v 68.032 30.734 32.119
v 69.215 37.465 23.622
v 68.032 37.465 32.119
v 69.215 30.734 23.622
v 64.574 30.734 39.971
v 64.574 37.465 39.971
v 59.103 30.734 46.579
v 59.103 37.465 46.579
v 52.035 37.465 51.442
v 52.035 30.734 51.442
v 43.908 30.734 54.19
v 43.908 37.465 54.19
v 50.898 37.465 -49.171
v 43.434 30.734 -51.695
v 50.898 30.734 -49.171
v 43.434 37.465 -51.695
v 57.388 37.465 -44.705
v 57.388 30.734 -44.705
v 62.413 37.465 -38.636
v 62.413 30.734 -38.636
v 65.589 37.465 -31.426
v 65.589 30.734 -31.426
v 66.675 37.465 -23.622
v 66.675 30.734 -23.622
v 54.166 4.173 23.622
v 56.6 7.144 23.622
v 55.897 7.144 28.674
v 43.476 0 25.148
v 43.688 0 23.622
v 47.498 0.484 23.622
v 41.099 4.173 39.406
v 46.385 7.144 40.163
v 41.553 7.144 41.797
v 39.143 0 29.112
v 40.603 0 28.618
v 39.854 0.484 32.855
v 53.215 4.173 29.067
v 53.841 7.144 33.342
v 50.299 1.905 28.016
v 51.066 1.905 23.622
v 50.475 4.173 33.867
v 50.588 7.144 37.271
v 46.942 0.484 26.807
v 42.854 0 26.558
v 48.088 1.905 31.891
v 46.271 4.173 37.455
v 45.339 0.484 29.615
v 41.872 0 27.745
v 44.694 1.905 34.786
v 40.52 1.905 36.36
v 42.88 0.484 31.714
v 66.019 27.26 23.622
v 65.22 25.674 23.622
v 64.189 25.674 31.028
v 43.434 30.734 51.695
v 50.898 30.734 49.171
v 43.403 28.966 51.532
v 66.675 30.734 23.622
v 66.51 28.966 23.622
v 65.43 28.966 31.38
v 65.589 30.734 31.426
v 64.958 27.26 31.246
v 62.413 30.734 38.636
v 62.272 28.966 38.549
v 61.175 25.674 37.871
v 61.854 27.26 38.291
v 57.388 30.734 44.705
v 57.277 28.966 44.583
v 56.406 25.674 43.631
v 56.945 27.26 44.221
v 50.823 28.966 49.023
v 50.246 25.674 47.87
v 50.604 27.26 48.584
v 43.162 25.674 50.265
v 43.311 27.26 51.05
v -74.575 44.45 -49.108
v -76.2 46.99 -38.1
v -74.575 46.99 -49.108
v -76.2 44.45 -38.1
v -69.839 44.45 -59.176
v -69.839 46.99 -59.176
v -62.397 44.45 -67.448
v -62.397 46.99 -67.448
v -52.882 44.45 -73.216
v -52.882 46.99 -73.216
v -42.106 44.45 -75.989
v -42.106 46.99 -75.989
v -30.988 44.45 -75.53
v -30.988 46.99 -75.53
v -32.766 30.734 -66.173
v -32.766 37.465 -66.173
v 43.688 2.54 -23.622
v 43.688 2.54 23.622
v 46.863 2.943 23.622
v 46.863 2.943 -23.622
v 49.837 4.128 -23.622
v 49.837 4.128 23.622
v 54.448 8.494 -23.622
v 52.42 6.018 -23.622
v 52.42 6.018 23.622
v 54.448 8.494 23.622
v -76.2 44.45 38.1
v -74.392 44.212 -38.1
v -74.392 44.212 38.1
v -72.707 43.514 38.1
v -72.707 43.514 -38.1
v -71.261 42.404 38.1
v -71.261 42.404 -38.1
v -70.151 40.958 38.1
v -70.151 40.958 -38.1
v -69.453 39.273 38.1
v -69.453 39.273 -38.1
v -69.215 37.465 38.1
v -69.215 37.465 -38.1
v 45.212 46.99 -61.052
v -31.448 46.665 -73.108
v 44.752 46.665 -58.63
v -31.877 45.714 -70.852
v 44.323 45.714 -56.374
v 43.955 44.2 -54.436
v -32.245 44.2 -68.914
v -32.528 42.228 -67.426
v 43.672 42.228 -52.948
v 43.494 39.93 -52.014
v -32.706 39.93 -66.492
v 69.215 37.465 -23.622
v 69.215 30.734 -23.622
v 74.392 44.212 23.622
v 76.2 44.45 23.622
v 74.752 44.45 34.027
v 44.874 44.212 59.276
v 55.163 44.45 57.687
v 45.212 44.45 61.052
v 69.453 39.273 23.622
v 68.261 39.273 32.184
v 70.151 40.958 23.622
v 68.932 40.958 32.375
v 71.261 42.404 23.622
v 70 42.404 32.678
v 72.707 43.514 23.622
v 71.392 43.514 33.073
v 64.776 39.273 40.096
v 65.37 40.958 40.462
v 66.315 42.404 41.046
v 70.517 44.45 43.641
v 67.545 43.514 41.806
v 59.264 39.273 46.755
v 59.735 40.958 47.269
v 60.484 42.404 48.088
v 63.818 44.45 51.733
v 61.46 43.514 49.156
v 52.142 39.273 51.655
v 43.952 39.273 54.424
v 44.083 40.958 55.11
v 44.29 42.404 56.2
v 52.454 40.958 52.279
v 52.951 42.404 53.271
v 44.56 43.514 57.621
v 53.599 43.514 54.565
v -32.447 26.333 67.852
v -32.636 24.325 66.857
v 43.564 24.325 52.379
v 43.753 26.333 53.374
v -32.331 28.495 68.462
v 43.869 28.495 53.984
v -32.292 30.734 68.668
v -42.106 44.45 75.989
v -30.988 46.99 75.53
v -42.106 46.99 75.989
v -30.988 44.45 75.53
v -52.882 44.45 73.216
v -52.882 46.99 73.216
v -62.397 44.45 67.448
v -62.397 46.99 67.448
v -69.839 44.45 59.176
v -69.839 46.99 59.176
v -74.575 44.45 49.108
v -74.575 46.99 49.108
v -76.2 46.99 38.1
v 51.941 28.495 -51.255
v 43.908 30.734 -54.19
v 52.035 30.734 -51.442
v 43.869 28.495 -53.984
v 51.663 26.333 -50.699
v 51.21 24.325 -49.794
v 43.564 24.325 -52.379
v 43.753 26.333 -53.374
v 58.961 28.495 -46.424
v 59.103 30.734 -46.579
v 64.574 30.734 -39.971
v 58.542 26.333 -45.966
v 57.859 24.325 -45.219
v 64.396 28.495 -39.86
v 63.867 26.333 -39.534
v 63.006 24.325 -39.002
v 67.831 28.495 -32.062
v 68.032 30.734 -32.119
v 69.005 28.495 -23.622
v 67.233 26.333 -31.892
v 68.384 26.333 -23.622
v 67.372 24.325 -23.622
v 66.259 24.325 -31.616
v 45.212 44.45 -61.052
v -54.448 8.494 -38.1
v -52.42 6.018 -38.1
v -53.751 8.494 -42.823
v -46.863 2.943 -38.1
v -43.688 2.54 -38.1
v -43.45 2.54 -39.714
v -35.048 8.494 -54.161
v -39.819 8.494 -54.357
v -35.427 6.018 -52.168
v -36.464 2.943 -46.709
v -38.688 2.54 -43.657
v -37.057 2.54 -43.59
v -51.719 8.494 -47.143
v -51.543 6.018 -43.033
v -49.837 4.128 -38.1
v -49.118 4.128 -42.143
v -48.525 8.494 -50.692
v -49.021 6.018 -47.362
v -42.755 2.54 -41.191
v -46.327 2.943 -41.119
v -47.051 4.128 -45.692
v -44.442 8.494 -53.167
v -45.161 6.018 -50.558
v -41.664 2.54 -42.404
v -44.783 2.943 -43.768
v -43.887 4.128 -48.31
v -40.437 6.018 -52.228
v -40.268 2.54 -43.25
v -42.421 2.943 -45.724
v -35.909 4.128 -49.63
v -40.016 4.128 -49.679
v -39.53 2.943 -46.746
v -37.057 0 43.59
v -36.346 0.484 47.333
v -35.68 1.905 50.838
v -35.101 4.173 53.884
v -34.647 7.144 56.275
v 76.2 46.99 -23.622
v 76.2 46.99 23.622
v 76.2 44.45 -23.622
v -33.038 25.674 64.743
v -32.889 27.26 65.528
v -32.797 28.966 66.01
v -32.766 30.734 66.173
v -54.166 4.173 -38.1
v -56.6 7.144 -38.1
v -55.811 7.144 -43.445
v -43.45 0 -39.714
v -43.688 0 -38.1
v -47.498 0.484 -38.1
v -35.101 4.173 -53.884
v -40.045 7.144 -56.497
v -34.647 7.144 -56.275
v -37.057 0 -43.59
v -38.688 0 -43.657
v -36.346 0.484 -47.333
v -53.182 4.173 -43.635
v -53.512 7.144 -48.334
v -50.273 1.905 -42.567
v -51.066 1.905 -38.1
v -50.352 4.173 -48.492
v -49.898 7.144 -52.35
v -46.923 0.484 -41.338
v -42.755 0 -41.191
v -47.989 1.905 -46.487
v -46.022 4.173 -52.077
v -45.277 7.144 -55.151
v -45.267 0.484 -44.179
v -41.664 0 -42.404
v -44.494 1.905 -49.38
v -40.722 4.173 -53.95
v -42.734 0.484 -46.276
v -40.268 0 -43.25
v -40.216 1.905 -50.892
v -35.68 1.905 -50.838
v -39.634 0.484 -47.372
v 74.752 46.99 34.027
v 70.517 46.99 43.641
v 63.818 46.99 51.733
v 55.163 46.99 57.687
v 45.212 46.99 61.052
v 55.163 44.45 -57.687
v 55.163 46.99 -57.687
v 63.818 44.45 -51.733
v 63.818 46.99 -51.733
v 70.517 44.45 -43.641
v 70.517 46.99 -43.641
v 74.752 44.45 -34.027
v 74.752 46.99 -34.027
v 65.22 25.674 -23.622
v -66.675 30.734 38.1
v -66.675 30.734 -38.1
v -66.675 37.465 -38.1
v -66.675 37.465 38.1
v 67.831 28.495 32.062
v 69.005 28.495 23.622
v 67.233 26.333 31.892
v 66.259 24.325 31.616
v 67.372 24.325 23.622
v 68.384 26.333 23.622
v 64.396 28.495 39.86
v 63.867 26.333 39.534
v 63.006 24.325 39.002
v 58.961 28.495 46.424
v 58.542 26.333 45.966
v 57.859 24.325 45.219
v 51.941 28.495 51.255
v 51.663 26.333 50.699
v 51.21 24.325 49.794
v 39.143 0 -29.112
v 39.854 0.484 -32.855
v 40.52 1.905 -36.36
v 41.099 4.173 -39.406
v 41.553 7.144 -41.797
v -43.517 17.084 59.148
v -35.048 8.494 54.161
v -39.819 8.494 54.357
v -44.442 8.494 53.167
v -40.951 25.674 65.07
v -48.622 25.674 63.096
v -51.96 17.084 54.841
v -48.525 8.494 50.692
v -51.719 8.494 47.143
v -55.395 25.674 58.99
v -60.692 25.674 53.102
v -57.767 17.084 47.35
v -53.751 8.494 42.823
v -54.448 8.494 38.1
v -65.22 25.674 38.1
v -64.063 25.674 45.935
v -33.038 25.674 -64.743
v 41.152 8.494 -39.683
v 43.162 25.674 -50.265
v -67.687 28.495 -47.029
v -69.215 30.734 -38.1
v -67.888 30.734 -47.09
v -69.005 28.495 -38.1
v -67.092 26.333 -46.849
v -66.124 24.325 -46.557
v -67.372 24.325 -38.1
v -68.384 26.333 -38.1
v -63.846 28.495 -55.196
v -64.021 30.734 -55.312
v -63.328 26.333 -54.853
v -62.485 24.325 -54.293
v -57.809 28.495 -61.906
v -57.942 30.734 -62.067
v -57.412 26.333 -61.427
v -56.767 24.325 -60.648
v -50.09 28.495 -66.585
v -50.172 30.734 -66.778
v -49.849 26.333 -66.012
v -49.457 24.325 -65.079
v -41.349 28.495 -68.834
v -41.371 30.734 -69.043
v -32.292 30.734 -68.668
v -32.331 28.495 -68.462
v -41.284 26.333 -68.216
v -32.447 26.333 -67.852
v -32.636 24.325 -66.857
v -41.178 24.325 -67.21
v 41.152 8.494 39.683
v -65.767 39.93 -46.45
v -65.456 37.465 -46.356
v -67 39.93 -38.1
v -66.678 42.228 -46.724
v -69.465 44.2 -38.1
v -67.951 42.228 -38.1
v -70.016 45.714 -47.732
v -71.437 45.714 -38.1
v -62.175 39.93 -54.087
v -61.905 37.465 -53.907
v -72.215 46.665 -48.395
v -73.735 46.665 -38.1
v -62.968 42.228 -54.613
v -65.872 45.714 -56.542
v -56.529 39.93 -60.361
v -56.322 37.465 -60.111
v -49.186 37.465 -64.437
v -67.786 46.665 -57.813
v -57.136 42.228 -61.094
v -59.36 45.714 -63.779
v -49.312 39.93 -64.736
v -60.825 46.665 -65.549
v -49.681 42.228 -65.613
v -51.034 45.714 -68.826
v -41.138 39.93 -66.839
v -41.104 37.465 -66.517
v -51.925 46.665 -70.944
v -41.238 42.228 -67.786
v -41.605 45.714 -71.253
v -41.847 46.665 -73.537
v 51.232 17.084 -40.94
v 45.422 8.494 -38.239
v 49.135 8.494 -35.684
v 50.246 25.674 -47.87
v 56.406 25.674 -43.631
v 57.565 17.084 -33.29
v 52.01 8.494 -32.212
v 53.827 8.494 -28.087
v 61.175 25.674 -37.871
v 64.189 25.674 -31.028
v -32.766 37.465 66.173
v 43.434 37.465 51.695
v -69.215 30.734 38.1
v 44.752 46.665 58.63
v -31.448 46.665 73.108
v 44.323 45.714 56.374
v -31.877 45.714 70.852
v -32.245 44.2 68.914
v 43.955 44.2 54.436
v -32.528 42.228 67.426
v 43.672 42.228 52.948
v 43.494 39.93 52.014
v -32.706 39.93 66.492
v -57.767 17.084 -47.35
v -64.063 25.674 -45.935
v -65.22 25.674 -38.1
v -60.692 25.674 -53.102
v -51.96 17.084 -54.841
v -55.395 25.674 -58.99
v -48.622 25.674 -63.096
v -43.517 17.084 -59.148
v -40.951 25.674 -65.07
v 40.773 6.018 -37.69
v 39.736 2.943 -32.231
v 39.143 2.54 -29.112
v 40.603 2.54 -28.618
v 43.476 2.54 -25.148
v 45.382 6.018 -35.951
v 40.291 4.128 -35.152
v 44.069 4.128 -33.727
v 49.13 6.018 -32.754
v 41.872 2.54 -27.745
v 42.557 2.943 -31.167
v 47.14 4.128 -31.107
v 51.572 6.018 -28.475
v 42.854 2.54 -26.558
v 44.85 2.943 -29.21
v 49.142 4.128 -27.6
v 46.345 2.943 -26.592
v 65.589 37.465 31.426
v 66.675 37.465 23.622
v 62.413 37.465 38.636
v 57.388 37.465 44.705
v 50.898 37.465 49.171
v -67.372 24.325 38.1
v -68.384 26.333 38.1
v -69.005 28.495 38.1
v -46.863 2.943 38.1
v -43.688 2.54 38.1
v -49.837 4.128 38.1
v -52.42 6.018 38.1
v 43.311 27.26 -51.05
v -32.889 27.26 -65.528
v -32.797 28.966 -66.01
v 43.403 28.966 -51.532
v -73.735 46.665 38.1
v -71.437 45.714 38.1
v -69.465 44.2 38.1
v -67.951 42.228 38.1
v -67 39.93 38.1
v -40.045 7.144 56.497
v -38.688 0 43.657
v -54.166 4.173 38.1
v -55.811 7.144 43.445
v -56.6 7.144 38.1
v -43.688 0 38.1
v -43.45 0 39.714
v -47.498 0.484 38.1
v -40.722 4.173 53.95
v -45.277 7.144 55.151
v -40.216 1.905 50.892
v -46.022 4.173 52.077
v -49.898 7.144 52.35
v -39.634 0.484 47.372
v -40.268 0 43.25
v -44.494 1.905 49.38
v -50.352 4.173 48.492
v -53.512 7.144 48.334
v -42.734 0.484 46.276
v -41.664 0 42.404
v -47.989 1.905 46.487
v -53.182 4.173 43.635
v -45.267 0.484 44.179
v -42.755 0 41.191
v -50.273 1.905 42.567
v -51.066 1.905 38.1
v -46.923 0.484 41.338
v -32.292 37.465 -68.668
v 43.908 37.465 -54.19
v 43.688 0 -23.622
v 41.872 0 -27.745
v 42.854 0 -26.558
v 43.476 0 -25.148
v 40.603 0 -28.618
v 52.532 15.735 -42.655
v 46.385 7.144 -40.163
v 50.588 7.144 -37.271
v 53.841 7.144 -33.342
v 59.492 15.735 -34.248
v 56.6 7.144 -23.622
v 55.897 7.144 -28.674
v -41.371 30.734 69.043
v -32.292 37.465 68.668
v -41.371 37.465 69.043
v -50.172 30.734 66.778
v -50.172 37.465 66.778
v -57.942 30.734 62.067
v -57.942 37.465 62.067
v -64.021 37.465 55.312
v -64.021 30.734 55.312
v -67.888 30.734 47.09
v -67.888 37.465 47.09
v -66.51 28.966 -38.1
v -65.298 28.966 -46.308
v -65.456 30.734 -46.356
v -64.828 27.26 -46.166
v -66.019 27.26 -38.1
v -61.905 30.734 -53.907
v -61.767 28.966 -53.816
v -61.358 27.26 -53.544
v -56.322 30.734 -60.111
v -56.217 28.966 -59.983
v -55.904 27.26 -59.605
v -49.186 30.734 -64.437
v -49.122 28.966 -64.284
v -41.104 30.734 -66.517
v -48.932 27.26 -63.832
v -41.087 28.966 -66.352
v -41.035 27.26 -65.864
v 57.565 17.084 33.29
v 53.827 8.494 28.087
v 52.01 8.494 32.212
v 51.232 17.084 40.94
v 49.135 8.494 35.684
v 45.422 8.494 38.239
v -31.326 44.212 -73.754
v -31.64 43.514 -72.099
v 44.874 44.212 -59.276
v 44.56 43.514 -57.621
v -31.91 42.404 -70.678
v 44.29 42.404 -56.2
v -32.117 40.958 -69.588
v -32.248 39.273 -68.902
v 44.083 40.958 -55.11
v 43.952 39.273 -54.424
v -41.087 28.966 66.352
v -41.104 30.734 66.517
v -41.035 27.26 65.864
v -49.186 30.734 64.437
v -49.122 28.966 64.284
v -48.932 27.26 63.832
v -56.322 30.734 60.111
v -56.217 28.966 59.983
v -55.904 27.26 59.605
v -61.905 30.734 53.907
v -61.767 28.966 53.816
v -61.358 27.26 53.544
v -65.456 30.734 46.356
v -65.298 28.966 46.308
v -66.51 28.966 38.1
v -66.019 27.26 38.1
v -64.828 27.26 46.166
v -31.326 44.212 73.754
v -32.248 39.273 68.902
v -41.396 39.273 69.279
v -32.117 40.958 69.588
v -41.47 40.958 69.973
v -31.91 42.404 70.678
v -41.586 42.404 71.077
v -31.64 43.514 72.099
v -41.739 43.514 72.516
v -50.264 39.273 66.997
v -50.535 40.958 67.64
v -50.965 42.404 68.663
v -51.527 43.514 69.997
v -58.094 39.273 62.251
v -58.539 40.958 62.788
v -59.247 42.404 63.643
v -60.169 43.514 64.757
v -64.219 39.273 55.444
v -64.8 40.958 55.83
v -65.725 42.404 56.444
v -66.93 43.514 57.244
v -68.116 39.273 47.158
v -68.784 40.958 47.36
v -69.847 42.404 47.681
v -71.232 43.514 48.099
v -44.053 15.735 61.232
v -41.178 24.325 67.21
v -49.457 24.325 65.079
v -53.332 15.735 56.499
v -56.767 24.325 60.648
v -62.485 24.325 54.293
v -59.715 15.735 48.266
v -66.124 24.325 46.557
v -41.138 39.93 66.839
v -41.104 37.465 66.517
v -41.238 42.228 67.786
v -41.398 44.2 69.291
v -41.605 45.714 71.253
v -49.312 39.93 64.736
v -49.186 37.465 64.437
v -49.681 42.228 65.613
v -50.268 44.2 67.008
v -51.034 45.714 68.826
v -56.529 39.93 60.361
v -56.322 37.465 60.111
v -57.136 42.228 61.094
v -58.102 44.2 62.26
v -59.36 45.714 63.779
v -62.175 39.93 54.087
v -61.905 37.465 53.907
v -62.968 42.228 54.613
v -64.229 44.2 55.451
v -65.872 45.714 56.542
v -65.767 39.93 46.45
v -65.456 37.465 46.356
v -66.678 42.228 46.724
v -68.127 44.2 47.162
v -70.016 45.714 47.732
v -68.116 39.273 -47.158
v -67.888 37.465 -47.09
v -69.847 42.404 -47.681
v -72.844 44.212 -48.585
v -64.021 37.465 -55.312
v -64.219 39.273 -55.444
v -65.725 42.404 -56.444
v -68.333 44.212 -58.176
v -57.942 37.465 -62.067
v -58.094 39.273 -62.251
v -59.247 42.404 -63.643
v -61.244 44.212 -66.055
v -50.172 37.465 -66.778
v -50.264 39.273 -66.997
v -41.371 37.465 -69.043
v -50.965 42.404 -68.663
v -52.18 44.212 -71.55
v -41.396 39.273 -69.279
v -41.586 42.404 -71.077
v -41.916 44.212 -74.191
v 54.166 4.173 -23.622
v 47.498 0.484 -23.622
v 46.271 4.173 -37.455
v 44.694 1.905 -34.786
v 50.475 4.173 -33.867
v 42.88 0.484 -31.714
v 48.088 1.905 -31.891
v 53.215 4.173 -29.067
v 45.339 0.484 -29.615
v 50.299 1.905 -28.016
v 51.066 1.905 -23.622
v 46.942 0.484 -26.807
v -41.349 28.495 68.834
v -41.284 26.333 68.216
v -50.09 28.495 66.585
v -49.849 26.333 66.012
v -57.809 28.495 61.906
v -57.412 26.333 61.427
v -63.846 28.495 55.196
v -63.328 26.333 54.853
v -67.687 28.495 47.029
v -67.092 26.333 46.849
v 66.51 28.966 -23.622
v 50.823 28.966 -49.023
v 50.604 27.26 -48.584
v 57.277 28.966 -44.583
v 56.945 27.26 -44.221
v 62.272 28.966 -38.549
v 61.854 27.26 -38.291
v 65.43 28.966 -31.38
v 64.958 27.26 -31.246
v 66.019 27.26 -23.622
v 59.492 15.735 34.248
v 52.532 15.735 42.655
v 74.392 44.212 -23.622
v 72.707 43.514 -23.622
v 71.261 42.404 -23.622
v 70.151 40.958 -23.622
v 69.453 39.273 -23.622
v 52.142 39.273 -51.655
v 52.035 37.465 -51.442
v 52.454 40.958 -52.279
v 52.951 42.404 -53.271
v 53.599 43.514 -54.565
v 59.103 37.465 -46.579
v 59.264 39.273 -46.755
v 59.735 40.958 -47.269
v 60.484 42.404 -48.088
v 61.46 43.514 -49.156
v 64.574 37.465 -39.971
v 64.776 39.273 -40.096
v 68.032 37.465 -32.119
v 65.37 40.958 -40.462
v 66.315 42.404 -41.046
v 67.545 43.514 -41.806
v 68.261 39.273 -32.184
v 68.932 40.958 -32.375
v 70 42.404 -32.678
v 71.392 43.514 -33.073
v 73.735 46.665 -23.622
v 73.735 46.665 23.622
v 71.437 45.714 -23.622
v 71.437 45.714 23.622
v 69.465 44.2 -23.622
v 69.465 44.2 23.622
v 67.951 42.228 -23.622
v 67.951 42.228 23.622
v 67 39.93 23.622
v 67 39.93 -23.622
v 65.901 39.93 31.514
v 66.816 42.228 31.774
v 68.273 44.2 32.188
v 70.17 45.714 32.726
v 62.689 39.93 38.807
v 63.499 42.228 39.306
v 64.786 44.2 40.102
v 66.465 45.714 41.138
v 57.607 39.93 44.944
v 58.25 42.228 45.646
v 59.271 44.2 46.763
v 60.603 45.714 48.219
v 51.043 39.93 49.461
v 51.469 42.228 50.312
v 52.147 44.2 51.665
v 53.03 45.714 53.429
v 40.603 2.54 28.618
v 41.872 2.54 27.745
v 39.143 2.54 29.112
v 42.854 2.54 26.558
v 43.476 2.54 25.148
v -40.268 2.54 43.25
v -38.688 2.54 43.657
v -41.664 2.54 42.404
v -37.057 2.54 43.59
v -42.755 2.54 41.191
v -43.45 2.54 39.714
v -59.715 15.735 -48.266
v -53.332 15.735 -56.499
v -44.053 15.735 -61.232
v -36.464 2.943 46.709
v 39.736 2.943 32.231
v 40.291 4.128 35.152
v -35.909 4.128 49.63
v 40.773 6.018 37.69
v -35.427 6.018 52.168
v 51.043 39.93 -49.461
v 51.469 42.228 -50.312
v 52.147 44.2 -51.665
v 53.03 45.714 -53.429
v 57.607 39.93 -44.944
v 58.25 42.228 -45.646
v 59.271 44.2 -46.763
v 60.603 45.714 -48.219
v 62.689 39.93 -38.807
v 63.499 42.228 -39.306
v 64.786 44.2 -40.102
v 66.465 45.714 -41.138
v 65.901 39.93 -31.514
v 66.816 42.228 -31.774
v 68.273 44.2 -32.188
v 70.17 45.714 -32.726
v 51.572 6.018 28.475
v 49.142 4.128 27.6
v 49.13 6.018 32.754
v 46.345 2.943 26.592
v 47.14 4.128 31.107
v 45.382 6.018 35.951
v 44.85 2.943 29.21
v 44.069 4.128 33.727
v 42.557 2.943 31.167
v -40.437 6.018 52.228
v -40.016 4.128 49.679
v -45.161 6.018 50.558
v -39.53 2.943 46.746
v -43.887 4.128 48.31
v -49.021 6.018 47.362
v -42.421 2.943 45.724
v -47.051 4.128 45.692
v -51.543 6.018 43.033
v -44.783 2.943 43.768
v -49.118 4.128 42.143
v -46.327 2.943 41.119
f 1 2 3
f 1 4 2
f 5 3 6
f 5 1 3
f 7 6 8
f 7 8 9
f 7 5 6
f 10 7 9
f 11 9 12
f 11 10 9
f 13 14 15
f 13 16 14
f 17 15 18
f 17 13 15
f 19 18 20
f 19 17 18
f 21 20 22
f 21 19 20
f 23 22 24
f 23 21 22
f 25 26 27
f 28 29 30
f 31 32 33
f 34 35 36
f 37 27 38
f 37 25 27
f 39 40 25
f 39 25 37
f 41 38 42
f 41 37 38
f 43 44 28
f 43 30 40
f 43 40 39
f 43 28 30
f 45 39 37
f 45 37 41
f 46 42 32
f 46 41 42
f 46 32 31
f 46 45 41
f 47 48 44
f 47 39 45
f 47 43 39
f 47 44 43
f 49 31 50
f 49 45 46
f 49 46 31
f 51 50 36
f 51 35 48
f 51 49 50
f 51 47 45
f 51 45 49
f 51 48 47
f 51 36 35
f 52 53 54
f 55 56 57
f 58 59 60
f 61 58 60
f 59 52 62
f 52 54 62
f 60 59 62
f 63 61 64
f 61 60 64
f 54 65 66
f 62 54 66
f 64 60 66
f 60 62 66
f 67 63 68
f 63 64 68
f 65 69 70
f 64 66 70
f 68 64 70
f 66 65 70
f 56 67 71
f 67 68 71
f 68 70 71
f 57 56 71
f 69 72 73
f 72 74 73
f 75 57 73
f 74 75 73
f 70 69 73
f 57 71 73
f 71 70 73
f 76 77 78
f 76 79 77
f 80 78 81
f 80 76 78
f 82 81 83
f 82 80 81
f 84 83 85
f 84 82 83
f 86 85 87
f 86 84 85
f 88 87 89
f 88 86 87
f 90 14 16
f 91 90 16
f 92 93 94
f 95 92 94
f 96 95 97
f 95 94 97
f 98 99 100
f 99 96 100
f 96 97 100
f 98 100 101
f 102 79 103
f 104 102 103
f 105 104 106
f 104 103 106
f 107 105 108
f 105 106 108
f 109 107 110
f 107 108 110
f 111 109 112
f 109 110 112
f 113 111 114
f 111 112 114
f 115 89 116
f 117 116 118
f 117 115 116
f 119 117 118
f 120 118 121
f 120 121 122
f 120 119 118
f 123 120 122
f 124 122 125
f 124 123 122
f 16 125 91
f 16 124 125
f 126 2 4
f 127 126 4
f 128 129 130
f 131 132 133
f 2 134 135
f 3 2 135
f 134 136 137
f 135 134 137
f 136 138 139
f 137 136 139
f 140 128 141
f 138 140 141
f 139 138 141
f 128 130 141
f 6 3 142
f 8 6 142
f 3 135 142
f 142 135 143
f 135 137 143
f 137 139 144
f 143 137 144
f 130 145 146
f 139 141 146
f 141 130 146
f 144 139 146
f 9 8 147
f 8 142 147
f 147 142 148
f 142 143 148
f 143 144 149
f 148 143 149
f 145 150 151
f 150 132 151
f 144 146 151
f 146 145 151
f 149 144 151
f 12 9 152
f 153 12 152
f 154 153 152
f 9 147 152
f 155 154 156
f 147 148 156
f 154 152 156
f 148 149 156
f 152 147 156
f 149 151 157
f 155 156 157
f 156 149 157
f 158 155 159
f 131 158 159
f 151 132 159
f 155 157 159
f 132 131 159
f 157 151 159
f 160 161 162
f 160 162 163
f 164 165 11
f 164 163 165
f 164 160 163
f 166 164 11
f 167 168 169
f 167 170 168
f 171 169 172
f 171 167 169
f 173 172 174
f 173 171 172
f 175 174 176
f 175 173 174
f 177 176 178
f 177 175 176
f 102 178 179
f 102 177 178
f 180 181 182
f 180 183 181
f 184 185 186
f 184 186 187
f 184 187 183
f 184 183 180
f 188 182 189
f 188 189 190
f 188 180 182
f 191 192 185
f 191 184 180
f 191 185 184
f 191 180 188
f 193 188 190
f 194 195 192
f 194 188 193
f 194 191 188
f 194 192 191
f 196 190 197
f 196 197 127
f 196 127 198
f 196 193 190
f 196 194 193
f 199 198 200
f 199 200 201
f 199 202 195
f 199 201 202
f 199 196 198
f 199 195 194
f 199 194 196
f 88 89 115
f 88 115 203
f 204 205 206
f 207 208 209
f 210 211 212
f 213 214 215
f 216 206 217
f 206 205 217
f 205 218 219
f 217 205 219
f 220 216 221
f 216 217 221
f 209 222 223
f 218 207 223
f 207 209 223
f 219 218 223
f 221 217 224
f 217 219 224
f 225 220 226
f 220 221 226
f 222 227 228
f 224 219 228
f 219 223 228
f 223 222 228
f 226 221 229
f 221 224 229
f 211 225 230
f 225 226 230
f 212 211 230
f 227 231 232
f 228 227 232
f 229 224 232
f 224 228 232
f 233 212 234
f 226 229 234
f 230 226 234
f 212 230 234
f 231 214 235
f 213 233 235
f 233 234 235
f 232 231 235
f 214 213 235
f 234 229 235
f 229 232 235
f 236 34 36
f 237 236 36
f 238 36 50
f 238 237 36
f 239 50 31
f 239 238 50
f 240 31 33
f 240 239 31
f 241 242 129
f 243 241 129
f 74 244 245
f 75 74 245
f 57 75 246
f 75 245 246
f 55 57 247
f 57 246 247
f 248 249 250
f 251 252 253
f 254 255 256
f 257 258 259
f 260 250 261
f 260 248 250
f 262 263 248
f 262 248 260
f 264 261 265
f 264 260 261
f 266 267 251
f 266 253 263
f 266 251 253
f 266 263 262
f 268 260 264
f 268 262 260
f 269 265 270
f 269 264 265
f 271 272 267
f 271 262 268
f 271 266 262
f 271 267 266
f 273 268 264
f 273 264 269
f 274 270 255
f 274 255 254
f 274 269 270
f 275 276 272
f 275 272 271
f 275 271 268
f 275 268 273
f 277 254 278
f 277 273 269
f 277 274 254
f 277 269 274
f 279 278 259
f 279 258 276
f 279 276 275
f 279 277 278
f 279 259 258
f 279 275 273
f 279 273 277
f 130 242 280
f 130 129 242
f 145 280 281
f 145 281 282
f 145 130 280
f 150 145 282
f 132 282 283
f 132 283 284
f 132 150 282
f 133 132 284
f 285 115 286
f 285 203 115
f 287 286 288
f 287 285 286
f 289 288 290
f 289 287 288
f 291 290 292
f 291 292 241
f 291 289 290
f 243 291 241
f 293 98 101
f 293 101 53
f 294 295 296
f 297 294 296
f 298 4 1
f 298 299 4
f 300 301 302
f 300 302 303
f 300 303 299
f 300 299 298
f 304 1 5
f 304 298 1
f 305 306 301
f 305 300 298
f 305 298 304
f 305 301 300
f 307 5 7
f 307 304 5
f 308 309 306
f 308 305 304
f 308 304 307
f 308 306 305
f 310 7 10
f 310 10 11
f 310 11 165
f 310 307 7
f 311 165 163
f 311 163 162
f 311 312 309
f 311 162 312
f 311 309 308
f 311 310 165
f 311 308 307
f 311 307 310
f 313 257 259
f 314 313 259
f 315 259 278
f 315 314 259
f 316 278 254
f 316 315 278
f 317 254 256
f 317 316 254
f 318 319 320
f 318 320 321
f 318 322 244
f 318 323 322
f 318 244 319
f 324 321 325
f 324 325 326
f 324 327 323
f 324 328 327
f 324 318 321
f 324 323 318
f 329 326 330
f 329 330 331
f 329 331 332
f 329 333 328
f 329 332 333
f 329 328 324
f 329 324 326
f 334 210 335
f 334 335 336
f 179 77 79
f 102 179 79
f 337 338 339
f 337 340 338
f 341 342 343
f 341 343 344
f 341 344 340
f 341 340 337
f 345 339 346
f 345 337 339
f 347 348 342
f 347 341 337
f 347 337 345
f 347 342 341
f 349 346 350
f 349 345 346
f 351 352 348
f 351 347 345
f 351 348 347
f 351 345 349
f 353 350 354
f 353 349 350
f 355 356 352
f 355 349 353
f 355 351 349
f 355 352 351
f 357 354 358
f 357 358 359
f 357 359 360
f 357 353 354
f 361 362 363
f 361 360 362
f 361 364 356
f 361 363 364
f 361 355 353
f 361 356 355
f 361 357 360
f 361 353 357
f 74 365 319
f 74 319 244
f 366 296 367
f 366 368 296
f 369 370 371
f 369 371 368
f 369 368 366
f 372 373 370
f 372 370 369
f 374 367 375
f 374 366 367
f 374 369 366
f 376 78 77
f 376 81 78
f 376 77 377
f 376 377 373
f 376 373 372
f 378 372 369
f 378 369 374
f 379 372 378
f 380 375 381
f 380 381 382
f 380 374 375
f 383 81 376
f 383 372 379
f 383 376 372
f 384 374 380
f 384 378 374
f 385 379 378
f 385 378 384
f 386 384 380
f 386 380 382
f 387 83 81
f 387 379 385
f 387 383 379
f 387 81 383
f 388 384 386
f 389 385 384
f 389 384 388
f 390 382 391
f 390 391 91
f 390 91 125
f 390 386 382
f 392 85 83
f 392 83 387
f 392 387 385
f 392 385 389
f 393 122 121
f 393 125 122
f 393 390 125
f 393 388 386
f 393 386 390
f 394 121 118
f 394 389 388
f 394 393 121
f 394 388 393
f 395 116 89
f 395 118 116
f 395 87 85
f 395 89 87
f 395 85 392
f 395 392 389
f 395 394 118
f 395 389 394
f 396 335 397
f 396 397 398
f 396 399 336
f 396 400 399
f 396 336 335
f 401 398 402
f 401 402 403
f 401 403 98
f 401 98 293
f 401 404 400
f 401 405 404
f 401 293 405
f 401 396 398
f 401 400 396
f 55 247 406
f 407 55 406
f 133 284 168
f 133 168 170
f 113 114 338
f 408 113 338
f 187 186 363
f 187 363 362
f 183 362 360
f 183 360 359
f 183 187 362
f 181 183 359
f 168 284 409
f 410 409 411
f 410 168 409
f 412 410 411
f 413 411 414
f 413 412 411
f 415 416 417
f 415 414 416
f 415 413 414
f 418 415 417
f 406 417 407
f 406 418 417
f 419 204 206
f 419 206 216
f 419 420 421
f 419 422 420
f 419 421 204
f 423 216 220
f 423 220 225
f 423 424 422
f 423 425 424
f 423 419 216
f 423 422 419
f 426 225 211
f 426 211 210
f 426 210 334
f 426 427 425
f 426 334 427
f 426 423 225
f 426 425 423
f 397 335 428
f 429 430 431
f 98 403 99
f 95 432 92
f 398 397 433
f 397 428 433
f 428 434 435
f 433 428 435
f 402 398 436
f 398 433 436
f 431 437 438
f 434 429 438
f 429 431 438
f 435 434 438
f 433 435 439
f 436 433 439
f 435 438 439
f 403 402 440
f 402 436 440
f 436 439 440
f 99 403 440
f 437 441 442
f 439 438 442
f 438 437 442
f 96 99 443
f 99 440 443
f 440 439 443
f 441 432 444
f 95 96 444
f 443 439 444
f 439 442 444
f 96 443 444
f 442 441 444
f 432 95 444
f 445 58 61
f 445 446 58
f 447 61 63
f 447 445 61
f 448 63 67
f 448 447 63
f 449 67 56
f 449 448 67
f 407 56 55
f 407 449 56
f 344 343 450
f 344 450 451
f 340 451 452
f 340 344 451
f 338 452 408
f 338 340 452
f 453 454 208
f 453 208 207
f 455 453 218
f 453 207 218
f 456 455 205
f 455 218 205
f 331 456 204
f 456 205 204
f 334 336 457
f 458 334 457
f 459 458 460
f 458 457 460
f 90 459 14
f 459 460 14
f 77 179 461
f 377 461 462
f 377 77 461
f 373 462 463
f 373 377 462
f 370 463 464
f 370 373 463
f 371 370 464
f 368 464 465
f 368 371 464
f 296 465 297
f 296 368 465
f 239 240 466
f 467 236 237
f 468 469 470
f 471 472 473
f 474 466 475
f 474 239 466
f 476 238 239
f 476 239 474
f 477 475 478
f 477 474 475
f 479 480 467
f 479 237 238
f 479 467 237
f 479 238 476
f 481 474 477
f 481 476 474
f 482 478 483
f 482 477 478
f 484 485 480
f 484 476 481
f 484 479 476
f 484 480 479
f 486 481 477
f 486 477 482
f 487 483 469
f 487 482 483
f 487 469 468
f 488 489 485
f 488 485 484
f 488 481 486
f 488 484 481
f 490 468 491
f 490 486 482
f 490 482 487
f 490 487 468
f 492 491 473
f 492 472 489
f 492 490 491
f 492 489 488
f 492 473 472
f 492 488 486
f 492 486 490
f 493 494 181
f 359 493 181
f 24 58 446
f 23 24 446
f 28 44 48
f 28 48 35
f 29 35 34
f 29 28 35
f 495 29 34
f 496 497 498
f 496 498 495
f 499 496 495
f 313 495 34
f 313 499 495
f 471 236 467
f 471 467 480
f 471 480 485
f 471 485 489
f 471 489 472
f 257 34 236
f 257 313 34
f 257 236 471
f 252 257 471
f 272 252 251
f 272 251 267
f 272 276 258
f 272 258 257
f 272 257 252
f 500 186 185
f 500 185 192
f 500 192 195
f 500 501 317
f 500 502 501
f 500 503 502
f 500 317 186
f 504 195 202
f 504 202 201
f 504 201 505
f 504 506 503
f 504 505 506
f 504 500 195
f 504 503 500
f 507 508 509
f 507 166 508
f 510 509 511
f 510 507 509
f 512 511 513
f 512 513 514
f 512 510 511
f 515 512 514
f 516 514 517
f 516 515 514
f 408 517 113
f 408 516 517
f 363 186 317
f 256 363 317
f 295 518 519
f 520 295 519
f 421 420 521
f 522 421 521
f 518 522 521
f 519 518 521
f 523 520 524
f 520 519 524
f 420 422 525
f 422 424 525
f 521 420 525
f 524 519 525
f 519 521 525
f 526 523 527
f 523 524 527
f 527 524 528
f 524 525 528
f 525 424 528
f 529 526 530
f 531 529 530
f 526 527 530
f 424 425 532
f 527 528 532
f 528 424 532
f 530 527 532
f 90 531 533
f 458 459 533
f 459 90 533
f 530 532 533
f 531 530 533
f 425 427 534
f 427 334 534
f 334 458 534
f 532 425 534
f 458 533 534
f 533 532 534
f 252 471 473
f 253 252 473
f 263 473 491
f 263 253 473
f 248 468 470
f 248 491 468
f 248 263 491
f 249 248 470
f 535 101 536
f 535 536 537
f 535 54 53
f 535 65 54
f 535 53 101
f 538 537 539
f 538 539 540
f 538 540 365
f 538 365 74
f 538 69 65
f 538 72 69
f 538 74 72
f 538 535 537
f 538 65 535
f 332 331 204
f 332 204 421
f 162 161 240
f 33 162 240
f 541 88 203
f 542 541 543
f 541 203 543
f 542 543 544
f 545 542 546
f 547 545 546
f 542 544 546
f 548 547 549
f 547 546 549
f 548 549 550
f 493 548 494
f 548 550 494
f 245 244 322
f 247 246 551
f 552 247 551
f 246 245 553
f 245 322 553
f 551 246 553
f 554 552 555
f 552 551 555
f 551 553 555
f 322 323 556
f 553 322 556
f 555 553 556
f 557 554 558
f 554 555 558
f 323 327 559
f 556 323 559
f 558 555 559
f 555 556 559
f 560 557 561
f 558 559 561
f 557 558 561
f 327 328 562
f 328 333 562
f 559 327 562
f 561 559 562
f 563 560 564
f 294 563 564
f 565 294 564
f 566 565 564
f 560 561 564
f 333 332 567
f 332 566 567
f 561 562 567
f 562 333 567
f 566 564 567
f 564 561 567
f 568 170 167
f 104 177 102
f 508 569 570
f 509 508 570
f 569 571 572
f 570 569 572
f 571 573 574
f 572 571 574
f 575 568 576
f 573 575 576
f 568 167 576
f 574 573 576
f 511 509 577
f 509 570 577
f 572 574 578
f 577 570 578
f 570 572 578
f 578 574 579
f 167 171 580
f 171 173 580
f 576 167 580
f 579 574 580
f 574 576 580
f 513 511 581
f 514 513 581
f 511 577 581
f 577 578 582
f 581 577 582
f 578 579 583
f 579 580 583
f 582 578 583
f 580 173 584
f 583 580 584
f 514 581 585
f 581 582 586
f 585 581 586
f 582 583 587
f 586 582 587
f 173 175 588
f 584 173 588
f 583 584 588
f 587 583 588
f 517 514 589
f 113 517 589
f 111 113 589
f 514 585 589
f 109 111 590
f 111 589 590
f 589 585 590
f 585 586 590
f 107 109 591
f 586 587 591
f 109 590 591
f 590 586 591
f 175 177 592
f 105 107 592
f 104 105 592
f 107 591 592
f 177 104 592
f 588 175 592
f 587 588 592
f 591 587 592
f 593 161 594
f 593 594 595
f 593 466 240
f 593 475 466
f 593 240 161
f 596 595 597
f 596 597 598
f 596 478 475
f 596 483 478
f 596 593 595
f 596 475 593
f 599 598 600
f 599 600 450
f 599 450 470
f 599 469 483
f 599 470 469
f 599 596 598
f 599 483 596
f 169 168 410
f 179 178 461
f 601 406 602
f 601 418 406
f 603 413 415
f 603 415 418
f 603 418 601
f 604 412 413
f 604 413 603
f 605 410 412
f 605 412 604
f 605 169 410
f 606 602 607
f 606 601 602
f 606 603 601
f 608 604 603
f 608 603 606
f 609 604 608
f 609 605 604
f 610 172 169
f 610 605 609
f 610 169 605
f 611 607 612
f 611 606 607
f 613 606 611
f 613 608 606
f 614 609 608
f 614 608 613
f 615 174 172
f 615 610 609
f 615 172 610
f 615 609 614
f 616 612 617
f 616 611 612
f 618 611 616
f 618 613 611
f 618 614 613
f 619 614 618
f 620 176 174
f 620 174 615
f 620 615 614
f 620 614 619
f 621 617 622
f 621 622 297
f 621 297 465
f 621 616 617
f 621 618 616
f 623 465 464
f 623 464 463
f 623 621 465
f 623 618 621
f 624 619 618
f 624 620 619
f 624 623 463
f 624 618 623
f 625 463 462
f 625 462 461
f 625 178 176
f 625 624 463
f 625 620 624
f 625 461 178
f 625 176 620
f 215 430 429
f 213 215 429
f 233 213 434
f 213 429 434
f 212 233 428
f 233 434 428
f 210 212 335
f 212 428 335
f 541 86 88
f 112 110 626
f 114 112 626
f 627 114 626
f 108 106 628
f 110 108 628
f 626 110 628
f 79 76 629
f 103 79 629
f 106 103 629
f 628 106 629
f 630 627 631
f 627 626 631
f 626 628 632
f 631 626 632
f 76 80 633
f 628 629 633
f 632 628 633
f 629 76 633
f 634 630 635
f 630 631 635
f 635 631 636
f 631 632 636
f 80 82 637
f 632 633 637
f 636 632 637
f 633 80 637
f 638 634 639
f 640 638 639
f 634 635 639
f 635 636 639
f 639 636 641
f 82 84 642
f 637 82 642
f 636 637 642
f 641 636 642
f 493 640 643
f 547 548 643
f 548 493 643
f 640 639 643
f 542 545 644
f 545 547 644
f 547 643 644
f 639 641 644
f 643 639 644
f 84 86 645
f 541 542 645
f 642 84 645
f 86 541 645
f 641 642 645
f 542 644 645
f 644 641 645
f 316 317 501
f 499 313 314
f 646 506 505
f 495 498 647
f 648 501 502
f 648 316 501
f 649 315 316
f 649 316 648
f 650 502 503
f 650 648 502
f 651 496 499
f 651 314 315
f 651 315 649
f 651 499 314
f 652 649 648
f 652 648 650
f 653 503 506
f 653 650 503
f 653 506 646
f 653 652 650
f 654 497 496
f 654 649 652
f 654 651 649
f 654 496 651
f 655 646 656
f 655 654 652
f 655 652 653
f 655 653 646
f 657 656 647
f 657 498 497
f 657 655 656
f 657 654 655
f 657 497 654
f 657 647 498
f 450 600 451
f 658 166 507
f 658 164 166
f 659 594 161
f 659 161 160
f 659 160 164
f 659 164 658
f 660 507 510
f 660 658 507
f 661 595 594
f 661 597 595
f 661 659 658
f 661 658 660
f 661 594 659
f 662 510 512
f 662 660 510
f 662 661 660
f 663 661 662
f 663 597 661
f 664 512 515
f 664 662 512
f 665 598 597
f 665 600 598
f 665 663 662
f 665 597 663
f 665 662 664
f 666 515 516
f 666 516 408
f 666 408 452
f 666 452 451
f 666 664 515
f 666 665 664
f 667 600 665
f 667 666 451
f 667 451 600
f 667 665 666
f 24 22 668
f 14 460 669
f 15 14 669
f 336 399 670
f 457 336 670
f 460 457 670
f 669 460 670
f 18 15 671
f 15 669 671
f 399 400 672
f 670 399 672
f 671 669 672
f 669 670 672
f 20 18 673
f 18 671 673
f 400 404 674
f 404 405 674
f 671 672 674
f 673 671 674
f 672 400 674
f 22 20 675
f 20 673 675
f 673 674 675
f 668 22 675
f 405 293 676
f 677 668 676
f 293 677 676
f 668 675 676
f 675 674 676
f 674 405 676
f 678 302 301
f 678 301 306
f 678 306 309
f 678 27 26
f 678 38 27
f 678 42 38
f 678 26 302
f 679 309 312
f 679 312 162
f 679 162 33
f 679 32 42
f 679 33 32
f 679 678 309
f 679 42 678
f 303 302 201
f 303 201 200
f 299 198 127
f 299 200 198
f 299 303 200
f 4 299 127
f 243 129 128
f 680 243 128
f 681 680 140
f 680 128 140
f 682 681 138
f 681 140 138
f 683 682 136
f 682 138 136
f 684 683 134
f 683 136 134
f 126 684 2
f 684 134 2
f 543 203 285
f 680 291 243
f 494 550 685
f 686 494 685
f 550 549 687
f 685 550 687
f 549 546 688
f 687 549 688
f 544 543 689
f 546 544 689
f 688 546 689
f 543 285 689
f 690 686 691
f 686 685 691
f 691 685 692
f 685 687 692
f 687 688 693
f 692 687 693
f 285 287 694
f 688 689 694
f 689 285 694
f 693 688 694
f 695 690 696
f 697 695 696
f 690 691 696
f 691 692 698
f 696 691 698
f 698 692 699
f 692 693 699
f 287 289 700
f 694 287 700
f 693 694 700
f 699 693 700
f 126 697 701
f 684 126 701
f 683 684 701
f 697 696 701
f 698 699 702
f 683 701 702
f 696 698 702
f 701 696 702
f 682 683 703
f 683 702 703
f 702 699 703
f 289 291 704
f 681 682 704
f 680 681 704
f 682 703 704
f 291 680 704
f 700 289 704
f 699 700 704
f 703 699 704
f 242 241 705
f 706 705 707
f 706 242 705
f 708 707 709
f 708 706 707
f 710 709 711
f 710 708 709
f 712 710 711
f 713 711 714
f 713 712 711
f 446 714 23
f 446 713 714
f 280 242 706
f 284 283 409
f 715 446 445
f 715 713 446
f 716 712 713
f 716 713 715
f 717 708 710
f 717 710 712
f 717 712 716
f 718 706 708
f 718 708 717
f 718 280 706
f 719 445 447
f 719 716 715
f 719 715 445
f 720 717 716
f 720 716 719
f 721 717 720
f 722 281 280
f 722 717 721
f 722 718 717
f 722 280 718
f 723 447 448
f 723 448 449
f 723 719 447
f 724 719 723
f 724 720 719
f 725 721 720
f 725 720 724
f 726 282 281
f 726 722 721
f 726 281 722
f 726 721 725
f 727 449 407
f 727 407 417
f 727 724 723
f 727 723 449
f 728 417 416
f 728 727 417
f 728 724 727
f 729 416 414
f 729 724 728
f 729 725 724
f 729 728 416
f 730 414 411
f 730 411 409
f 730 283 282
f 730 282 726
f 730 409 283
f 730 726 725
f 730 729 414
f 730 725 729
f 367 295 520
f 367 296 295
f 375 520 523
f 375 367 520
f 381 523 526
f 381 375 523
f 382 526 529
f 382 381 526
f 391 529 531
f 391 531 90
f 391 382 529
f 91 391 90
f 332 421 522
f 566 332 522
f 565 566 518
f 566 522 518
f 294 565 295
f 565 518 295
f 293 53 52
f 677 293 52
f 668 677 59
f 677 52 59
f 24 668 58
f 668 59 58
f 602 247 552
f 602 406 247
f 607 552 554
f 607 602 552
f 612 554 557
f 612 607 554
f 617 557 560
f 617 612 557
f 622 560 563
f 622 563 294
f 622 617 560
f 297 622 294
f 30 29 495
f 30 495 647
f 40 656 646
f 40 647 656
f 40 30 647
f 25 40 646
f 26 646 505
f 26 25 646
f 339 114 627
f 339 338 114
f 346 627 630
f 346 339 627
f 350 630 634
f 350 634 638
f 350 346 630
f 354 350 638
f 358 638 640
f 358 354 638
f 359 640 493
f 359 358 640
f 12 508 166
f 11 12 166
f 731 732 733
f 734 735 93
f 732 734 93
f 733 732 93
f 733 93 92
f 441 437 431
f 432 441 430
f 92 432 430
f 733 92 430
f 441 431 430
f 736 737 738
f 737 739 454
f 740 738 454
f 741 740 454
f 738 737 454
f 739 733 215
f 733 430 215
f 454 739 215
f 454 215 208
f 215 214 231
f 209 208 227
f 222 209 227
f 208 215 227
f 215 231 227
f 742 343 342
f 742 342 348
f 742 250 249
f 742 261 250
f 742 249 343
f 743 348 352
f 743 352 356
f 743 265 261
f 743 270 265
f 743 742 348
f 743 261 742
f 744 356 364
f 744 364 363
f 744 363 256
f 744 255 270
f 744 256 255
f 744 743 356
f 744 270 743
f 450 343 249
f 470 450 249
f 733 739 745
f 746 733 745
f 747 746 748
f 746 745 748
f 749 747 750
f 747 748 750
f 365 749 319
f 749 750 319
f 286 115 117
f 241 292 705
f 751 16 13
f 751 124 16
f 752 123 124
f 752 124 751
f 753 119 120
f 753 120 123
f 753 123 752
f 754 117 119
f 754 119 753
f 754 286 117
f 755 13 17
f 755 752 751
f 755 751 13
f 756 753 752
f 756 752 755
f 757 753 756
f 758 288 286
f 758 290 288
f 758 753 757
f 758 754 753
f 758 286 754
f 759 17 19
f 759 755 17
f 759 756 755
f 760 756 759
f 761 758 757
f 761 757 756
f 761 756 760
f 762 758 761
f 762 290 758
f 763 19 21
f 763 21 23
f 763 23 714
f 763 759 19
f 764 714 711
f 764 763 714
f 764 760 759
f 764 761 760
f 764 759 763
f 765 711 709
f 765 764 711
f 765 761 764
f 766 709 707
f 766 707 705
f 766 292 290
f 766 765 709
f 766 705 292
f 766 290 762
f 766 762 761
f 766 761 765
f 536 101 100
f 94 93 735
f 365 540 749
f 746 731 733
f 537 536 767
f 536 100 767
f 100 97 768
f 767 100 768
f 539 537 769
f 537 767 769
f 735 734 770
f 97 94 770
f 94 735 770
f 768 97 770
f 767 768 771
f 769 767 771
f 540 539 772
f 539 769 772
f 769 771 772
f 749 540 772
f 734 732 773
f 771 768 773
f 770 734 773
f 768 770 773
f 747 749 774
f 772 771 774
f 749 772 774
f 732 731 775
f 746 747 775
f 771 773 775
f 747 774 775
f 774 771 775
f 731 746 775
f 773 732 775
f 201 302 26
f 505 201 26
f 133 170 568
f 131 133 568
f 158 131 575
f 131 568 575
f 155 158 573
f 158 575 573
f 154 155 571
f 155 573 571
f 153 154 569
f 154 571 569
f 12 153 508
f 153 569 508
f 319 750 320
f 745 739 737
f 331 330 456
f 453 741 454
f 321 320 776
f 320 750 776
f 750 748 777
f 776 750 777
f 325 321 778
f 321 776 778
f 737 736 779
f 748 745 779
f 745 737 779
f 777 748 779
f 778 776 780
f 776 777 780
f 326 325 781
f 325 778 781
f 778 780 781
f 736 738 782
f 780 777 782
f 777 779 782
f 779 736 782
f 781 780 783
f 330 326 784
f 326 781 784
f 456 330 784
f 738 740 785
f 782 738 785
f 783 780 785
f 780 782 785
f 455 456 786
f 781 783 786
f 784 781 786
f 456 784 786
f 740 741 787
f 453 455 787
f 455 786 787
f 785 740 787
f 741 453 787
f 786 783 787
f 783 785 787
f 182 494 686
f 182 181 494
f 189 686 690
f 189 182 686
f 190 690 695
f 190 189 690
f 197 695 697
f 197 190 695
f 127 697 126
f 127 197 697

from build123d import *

# Parameters (mm, degrees)
BOSS_EXTRUDE2_START = 2.54
BOSS_EXTRUDE2_DEPTH = 2.54


with BuildPart() as part:
    # Sweep1: sweep along a path in Sketch3
    with BuildLine(Plane(origin=(0, 0, 0), x_dir=(1, 0, 0), z_dir=(0, 1, 0))) as sweep1_path:
        Line((-30.988229394, 75.53037161), (45.211770606, 61.05237161))
        ThreePointArc((45.211770606, 61.05237161), (67.44764437, 47.918620546), (76.2, 23.622))
        Line((76.2, 23.622), (76.2, -23.622))
        ThreePointArc((76.2, -23.622), (67.44764437, -47.918620546), (45.211770606, -61.05237161))
        Line((45.211770606, -61.05237161), (-30.988229394, -75.53037161))
        ThreePointArc((-30.988229394, -75.53037161), (-62.396620546, -67.44764437), (-76.2, -38.1))
        Line((-76.2, -38.1), (-76.2, 38.1))
        ThreePointArc((-76.2, 38.1), (-62.396620546, 67.44764437), (-30.988229394, 75.53037161))
    # Sketch2 → Sweep1 (sweep)
    with BuildSketch(Plane.XY):
        with BuildLine():
            Line((-66.675, 37.465), (-66.675, 30.734))
            ThreePointArc((-66.675, 30.734), (-66.304017394, 28.101588452), (-65.219967862, 25.674232841))
            Line((-65.219967862, 25.674232841), (-54.44795715, 8.493643788))
            ThreePointArc((-54.44795715, 8.493643788), (-49.836628957, 4.127648226), (-43.688, 2.54))
            Line((-43.688, 2.54), (-43.688, 0))
            ThreePointArc((-43.688, 0), (-51.066354749, 1.905177871), (-56.59994858, 7.144372546))
            Line((-56.59994858, 7.144372546), (-67.371959292, 24.324961599))
            ThreePointArc((-67.371959292, 24.324961599), (-68.745088699, 27.39961204), (-69.215, 30.734))
            Line((-69.215, 30.734), (-69.215, 37.465))
            ThreePointArc((-69.215, 37.465), (-71.260859133, 42.404140867), (-76.2, 44.45))
            Line((-76.2, 44.45), (-76.2, 46.99))
            ThreePointArc((-76.2, 46.99), (-69.464807909, 44.200192091), (-66.675, 37.465))
        make_face()
    sweep(path=sweep1_path.line)

    # Sketch5 → Boss-Extrude2 (add)
    with BuildSketch(Plane(origin=(0, 0, 0), x_dir=(1, 0, 0), z_dir=(0, 1, 0)).offset(BOSS_EXTRUDE2_START)):
        with BuildLine():
            Line((43.688, 23.622), (43.688, -23.622))
            ThreePointArc((43.688, -23.622), (42.404321174, -27.185504347), (39.143059689, -29.111787836))
            Line((39.143059689, -29.111787836), (-37.056940311, -43.589787836))
            ThreePointArc((-37.056940311, -43.589787836), (-41.663504347, -42.404321174), (-43.688, -38.1))
            Line((-43.688, -38.1), (-43.688, 0))
            Line((-43.688, 0), (-43.688, 38.1))
            ThreePointArc((-43.688, 38.1), (-41.663504347, 42.404321174), (-37.056940311, 43.589787836))
            Line((-37.056940311, 43.589787836), (39.143059689, 29.111787836))
            ThreePointArc((39.143059689, 29.111787836), (42.404321174, 27.185504347), (43.688, 23.622))
        make_face()
    extrude(amount=-BOSS_EXTRUDE2_DEPTH)


solid = part.part
